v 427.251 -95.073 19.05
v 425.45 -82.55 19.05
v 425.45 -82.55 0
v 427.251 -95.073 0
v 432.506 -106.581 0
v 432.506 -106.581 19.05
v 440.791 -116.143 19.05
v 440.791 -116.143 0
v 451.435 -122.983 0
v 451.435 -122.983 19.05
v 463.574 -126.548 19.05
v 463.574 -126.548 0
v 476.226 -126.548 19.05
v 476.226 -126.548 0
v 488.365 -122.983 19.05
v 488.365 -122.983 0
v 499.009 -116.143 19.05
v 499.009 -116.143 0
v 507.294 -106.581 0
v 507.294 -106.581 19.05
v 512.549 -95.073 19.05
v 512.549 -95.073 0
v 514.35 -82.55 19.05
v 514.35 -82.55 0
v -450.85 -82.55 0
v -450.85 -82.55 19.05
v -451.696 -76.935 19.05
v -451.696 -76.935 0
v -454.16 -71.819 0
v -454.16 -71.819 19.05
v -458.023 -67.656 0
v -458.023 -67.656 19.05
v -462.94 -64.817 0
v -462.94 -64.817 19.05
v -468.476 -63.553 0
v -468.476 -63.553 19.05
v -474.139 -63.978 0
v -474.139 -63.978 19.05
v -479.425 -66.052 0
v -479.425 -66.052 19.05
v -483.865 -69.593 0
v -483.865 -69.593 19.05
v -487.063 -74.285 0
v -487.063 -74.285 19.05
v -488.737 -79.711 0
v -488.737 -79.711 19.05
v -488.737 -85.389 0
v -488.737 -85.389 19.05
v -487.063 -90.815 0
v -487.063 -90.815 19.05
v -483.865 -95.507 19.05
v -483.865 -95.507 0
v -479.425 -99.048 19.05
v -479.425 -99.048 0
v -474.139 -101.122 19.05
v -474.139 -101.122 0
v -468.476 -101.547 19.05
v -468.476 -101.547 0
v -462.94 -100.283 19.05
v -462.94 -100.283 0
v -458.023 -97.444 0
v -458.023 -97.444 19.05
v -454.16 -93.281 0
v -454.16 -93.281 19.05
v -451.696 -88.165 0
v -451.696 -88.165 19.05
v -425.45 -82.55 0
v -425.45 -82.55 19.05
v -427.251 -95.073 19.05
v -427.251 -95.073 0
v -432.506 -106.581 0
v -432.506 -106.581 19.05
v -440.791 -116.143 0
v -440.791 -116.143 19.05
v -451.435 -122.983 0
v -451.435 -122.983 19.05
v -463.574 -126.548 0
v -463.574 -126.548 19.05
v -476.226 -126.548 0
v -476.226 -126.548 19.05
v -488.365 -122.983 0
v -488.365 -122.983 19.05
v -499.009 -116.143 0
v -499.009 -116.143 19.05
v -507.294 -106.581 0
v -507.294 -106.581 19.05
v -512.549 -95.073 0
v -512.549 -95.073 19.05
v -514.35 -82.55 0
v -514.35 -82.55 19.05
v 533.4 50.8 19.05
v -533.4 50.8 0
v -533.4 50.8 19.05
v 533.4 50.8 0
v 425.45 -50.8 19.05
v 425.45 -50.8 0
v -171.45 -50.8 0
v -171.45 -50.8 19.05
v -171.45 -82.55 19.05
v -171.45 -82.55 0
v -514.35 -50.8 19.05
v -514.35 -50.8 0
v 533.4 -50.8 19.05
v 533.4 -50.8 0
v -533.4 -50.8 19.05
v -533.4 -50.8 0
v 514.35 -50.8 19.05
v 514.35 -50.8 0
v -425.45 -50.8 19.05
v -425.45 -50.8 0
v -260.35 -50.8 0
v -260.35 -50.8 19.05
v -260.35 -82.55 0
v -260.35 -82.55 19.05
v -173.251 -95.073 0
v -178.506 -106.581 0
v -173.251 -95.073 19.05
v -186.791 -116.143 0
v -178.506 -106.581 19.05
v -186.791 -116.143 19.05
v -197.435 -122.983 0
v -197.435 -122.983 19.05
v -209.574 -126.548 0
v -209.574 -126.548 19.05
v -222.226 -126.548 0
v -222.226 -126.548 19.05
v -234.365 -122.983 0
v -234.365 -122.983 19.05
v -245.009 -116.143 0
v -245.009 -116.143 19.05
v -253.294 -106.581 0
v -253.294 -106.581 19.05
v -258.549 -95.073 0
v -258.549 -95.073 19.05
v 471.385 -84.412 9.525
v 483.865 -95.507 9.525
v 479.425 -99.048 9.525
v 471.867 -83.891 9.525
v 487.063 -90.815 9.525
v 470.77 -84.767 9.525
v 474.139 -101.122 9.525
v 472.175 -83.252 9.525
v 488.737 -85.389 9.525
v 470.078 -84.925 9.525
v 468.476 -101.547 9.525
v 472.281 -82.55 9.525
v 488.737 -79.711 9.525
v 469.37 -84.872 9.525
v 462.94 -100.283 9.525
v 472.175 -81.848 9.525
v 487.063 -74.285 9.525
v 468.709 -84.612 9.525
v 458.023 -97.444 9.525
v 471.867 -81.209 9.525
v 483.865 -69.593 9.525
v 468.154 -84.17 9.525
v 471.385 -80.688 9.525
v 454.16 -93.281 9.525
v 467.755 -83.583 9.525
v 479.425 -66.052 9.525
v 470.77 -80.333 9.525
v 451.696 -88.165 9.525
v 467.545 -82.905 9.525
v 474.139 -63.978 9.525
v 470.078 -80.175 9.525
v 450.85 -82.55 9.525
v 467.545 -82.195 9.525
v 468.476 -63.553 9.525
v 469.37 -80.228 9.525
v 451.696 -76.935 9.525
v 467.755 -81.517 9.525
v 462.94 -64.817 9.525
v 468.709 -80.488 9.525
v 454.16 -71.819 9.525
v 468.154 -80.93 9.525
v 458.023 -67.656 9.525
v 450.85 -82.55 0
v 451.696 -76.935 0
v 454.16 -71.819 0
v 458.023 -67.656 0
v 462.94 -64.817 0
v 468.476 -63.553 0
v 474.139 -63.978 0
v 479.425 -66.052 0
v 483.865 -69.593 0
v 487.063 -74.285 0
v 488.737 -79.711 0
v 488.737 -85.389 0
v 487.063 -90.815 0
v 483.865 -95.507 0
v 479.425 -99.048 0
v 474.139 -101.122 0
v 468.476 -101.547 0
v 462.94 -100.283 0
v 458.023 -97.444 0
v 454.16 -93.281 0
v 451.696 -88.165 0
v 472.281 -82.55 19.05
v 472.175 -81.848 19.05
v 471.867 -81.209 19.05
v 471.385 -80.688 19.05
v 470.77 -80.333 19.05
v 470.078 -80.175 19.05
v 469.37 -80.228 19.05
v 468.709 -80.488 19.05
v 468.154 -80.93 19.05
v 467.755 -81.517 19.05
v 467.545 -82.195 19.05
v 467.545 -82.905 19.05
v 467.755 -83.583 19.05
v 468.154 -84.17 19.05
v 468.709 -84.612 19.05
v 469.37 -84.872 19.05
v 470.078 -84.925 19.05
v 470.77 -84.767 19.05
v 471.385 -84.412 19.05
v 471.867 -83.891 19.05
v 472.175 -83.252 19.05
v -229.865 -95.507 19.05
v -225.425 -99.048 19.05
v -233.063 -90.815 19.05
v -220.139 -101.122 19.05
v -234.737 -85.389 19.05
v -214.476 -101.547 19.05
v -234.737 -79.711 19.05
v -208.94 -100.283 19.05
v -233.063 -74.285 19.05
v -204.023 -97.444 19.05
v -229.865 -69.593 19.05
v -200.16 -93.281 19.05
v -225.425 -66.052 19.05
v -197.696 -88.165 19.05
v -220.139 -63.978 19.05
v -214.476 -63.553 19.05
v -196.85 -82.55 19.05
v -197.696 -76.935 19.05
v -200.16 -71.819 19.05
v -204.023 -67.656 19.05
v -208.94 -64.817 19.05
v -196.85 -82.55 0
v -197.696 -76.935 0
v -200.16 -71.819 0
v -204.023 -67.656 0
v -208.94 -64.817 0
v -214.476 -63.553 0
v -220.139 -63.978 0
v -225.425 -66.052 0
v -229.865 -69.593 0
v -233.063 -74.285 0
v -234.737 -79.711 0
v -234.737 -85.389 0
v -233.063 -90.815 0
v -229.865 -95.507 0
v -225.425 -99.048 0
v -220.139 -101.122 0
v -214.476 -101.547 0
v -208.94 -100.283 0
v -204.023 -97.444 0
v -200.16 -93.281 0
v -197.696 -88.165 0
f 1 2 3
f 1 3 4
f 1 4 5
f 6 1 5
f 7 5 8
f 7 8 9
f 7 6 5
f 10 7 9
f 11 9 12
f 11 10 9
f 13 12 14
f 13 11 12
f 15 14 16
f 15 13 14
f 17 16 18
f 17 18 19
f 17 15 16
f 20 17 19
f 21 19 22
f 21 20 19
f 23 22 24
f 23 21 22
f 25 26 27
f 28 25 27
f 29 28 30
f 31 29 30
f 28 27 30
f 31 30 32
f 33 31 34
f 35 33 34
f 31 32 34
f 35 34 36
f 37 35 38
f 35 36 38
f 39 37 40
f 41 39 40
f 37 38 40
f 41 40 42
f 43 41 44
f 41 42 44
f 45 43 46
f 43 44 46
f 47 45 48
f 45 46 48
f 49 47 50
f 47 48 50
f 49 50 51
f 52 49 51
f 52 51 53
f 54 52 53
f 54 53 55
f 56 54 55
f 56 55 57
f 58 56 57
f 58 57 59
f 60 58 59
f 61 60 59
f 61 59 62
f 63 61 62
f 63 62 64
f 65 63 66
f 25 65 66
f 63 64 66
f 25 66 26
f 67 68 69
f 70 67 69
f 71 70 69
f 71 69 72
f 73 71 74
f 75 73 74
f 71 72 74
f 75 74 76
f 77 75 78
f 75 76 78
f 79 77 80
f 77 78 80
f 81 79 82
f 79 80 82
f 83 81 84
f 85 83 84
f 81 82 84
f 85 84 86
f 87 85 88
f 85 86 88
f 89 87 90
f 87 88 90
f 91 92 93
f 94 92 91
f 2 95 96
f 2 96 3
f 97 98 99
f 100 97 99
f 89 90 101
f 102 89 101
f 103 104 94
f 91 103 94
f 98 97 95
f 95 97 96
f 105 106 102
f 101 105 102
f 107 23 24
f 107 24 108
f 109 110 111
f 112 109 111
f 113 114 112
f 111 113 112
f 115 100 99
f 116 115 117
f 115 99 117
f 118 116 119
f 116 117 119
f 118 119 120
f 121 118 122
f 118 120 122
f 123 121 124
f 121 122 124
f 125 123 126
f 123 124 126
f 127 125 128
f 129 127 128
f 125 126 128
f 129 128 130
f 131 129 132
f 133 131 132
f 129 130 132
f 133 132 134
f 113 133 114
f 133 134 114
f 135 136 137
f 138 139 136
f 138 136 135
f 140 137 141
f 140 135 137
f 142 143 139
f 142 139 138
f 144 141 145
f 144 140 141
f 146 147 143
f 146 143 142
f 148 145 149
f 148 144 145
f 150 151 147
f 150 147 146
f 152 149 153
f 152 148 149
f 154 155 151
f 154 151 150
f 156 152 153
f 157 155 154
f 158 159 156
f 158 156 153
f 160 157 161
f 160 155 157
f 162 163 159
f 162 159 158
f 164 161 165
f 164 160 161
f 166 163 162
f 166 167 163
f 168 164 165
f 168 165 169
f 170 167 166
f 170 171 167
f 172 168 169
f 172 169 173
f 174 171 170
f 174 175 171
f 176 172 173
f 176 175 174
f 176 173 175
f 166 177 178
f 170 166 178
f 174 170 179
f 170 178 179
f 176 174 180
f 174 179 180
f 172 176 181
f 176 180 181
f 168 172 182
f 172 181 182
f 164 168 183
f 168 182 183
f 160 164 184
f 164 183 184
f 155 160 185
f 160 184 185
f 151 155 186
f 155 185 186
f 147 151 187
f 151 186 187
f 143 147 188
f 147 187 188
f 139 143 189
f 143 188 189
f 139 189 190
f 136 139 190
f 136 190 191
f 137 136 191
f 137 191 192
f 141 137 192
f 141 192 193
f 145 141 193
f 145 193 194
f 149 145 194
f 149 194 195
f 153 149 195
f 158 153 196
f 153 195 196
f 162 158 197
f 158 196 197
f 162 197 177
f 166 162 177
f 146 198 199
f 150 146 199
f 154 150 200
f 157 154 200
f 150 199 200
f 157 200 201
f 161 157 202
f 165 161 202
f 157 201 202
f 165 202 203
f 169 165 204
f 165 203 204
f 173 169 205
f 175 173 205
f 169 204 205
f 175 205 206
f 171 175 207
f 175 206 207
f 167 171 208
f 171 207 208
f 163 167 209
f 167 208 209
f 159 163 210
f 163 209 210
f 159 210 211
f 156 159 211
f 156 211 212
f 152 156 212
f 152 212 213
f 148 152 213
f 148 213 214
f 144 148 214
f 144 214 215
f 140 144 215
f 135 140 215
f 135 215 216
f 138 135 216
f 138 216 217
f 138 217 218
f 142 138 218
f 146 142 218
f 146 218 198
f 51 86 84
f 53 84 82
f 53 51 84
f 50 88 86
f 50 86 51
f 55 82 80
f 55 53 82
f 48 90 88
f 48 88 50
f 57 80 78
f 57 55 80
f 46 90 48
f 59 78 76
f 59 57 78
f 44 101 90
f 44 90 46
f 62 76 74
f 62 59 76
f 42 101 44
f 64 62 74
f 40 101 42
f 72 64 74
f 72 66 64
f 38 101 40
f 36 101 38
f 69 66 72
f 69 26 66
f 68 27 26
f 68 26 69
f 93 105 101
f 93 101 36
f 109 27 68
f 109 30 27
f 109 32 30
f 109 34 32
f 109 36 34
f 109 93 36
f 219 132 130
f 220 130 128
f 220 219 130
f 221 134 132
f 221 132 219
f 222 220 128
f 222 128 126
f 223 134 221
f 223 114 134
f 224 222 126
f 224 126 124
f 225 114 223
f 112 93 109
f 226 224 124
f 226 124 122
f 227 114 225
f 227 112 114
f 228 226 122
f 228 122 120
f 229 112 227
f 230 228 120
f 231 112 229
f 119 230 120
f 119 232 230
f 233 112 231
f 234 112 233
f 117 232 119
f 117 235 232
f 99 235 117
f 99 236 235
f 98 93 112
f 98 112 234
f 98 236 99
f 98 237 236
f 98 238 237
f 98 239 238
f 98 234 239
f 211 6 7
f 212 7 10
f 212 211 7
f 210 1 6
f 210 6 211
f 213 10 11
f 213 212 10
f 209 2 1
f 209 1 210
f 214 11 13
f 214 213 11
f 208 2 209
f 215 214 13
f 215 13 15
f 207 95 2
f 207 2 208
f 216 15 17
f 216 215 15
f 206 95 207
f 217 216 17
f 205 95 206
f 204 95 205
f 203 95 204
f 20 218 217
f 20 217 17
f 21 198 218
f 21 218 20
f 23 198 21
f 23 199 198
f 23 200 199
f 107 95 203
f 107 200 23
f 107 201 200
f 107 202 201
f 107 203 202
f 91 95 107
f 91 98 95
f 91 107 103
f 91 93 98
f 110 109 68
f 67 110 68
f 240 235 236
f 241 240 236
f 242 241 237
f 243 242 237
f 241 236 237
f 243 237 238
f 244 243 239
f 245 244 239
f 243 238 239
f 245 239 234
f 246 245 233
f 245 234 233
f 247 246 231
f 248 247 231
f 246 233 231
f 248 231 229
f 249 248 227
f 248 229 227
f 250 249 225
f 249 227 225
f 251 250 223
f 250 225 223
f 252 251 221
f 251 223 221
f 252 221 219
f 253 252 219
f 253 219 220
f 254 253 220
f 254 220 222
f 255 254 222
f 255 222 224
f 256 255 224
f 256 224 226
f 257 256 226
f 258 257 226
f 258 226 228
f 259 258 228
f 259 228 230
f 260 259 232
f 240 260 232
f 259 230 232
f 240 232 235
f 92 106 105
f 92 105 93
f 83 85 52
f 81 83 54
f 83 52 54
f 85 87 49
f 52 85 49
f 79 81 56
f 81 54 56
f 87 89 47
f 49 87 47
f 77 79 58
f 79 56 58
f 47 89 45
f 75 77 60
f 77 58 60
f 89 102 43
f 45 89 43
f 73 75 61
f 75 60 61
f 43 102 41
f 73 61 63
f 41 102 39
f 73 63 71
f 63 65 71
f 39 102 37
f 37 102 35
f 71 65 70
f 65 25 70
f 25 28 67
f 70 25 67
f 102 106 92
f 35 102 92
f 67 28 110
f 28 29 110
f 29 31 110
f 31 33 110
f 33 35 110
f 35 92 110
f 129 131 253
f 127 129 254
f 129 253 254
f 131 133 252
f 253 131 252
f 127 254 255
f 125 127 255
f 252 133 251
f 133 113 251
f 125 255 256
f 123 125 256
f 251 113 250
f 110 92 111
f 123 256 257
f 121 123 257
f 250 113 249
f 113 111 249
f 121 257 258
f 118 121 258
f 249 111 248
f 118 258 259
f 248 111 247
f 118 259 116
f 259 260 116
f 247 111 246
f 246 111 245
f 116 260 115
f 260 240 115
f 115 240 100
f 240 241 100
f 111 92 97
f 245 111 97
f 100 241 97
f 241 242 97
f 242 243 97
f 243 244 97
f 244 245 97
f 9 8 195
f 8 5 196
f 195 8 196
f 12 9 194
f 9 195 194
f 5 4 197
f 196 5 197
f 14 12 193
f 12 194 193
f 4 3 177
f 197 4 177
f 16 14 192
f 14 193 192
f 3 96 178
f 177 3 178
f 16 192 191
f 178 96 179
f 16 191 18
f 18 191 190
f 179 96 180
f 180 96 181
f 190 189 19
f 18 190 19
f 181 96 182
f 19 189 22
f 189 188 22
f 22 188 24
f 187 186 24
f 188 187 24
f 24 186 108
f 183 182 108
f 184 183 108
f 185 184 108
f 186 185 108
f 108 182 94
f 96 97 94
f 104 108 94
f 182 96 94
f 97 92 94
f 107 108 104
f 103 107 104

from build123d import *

# Parameters (mm, degrees)
SKETCH1_W           = 1066.8
SKETCH1_H           = 101.6
BOSS_EXTRUDE1_DEPTH = 19.05
SKETCH2_R           = 19.05
SKETCH2_R_2         = 2.38125
BOSS_EXTRUDE2_DEPTH = 19.05
SKETCH4_R           = 19.05
CUT_EXTRUDE1_DEPTH  = 9.525


with BuildPart() as part:
    # Sketch1 → Boss-Extrude1 (new body)
    with BuildSketch(Plane.XY):
        Rectangle(SKETCH1_W, SKETCH1_H)
    extrude(amount=BOSS_EXTRUDE1_DEPTH)

    # Sketch2 → Boss-Extrude2 (add)
    # profile 1 of 3: a face of its own
    with BuildSketch(Plane.XY.offset(19.05)):
        with BuildLine():
            Line((-514.35, -50.8), (-425.45, -50.8))
            Line((-425.45, -50.8), (-425.45, -82.55))
            ThreePointArc((-425.45, -82.55), (-469.9, -127), (-514.35, -82.55))
            Line((-514.35, -82.55), (-514.35, -50.8))
        make_face()
        with Locations((-469.9, -82.55)):
            Circle(SKETCH2_R, mode=Mode.SUBTRACT)
    # profile 2 of 3: a face of its own
    with BuildSketch(Plane.XY.offset(19.05)):
        with BuildLine():
            Line((514.35, -50.8), (425.45, -50.8))
            Line((425.45, -50.8), (425.45, -82.55))
            ThreePointArc((425.45, -82.55), (469.9, -127), (514.35, -82.55))
            Line((514.35, -82.55), (514.35, -50.8))
        make_face()
        with Locations((469.9, -82.55)):
            Circle(SKETCH2_R_2, mode=Mode.SUBTRACT)
    # profile 3 of 3: a face of its own
    with BuildSketch(Plane.XY.offset(19.05)):
        with BuildLine():
            Line((-260.35, -50.8), (-171.45, -50.8))
            Line((-171.45, -50.8), (-171.45, -82.55))
            ThreePointArc((-171.45, -82.55), (-215.9, -127), (-260.35, -82.55))
            Line((-260.35, -82.55), (-260.35, -50.8))
        make_face()
        with Locations((-215.9, -82.55)):
            Circle(SKETCH2_R, mode=Mode.SUBTRACT)
    extrude(amount=-BOSS_EXTRUDE2_DEPTH)

    # Sketch4 → Cut-Extrude1 (cut)
    with BuildSketch(Plane(origin=(0, 0, 0), x_dir=(-1, 0, 0), z_dir=(0, 0, -1))):
        with Locations((-469.9, -82.55)):
            Circle(SKETCH4_R)
    extrude(amount=-CUT_EXTRUDE1_DEPTH, mode=Mode.SUBTRACT)


solid = part.part
